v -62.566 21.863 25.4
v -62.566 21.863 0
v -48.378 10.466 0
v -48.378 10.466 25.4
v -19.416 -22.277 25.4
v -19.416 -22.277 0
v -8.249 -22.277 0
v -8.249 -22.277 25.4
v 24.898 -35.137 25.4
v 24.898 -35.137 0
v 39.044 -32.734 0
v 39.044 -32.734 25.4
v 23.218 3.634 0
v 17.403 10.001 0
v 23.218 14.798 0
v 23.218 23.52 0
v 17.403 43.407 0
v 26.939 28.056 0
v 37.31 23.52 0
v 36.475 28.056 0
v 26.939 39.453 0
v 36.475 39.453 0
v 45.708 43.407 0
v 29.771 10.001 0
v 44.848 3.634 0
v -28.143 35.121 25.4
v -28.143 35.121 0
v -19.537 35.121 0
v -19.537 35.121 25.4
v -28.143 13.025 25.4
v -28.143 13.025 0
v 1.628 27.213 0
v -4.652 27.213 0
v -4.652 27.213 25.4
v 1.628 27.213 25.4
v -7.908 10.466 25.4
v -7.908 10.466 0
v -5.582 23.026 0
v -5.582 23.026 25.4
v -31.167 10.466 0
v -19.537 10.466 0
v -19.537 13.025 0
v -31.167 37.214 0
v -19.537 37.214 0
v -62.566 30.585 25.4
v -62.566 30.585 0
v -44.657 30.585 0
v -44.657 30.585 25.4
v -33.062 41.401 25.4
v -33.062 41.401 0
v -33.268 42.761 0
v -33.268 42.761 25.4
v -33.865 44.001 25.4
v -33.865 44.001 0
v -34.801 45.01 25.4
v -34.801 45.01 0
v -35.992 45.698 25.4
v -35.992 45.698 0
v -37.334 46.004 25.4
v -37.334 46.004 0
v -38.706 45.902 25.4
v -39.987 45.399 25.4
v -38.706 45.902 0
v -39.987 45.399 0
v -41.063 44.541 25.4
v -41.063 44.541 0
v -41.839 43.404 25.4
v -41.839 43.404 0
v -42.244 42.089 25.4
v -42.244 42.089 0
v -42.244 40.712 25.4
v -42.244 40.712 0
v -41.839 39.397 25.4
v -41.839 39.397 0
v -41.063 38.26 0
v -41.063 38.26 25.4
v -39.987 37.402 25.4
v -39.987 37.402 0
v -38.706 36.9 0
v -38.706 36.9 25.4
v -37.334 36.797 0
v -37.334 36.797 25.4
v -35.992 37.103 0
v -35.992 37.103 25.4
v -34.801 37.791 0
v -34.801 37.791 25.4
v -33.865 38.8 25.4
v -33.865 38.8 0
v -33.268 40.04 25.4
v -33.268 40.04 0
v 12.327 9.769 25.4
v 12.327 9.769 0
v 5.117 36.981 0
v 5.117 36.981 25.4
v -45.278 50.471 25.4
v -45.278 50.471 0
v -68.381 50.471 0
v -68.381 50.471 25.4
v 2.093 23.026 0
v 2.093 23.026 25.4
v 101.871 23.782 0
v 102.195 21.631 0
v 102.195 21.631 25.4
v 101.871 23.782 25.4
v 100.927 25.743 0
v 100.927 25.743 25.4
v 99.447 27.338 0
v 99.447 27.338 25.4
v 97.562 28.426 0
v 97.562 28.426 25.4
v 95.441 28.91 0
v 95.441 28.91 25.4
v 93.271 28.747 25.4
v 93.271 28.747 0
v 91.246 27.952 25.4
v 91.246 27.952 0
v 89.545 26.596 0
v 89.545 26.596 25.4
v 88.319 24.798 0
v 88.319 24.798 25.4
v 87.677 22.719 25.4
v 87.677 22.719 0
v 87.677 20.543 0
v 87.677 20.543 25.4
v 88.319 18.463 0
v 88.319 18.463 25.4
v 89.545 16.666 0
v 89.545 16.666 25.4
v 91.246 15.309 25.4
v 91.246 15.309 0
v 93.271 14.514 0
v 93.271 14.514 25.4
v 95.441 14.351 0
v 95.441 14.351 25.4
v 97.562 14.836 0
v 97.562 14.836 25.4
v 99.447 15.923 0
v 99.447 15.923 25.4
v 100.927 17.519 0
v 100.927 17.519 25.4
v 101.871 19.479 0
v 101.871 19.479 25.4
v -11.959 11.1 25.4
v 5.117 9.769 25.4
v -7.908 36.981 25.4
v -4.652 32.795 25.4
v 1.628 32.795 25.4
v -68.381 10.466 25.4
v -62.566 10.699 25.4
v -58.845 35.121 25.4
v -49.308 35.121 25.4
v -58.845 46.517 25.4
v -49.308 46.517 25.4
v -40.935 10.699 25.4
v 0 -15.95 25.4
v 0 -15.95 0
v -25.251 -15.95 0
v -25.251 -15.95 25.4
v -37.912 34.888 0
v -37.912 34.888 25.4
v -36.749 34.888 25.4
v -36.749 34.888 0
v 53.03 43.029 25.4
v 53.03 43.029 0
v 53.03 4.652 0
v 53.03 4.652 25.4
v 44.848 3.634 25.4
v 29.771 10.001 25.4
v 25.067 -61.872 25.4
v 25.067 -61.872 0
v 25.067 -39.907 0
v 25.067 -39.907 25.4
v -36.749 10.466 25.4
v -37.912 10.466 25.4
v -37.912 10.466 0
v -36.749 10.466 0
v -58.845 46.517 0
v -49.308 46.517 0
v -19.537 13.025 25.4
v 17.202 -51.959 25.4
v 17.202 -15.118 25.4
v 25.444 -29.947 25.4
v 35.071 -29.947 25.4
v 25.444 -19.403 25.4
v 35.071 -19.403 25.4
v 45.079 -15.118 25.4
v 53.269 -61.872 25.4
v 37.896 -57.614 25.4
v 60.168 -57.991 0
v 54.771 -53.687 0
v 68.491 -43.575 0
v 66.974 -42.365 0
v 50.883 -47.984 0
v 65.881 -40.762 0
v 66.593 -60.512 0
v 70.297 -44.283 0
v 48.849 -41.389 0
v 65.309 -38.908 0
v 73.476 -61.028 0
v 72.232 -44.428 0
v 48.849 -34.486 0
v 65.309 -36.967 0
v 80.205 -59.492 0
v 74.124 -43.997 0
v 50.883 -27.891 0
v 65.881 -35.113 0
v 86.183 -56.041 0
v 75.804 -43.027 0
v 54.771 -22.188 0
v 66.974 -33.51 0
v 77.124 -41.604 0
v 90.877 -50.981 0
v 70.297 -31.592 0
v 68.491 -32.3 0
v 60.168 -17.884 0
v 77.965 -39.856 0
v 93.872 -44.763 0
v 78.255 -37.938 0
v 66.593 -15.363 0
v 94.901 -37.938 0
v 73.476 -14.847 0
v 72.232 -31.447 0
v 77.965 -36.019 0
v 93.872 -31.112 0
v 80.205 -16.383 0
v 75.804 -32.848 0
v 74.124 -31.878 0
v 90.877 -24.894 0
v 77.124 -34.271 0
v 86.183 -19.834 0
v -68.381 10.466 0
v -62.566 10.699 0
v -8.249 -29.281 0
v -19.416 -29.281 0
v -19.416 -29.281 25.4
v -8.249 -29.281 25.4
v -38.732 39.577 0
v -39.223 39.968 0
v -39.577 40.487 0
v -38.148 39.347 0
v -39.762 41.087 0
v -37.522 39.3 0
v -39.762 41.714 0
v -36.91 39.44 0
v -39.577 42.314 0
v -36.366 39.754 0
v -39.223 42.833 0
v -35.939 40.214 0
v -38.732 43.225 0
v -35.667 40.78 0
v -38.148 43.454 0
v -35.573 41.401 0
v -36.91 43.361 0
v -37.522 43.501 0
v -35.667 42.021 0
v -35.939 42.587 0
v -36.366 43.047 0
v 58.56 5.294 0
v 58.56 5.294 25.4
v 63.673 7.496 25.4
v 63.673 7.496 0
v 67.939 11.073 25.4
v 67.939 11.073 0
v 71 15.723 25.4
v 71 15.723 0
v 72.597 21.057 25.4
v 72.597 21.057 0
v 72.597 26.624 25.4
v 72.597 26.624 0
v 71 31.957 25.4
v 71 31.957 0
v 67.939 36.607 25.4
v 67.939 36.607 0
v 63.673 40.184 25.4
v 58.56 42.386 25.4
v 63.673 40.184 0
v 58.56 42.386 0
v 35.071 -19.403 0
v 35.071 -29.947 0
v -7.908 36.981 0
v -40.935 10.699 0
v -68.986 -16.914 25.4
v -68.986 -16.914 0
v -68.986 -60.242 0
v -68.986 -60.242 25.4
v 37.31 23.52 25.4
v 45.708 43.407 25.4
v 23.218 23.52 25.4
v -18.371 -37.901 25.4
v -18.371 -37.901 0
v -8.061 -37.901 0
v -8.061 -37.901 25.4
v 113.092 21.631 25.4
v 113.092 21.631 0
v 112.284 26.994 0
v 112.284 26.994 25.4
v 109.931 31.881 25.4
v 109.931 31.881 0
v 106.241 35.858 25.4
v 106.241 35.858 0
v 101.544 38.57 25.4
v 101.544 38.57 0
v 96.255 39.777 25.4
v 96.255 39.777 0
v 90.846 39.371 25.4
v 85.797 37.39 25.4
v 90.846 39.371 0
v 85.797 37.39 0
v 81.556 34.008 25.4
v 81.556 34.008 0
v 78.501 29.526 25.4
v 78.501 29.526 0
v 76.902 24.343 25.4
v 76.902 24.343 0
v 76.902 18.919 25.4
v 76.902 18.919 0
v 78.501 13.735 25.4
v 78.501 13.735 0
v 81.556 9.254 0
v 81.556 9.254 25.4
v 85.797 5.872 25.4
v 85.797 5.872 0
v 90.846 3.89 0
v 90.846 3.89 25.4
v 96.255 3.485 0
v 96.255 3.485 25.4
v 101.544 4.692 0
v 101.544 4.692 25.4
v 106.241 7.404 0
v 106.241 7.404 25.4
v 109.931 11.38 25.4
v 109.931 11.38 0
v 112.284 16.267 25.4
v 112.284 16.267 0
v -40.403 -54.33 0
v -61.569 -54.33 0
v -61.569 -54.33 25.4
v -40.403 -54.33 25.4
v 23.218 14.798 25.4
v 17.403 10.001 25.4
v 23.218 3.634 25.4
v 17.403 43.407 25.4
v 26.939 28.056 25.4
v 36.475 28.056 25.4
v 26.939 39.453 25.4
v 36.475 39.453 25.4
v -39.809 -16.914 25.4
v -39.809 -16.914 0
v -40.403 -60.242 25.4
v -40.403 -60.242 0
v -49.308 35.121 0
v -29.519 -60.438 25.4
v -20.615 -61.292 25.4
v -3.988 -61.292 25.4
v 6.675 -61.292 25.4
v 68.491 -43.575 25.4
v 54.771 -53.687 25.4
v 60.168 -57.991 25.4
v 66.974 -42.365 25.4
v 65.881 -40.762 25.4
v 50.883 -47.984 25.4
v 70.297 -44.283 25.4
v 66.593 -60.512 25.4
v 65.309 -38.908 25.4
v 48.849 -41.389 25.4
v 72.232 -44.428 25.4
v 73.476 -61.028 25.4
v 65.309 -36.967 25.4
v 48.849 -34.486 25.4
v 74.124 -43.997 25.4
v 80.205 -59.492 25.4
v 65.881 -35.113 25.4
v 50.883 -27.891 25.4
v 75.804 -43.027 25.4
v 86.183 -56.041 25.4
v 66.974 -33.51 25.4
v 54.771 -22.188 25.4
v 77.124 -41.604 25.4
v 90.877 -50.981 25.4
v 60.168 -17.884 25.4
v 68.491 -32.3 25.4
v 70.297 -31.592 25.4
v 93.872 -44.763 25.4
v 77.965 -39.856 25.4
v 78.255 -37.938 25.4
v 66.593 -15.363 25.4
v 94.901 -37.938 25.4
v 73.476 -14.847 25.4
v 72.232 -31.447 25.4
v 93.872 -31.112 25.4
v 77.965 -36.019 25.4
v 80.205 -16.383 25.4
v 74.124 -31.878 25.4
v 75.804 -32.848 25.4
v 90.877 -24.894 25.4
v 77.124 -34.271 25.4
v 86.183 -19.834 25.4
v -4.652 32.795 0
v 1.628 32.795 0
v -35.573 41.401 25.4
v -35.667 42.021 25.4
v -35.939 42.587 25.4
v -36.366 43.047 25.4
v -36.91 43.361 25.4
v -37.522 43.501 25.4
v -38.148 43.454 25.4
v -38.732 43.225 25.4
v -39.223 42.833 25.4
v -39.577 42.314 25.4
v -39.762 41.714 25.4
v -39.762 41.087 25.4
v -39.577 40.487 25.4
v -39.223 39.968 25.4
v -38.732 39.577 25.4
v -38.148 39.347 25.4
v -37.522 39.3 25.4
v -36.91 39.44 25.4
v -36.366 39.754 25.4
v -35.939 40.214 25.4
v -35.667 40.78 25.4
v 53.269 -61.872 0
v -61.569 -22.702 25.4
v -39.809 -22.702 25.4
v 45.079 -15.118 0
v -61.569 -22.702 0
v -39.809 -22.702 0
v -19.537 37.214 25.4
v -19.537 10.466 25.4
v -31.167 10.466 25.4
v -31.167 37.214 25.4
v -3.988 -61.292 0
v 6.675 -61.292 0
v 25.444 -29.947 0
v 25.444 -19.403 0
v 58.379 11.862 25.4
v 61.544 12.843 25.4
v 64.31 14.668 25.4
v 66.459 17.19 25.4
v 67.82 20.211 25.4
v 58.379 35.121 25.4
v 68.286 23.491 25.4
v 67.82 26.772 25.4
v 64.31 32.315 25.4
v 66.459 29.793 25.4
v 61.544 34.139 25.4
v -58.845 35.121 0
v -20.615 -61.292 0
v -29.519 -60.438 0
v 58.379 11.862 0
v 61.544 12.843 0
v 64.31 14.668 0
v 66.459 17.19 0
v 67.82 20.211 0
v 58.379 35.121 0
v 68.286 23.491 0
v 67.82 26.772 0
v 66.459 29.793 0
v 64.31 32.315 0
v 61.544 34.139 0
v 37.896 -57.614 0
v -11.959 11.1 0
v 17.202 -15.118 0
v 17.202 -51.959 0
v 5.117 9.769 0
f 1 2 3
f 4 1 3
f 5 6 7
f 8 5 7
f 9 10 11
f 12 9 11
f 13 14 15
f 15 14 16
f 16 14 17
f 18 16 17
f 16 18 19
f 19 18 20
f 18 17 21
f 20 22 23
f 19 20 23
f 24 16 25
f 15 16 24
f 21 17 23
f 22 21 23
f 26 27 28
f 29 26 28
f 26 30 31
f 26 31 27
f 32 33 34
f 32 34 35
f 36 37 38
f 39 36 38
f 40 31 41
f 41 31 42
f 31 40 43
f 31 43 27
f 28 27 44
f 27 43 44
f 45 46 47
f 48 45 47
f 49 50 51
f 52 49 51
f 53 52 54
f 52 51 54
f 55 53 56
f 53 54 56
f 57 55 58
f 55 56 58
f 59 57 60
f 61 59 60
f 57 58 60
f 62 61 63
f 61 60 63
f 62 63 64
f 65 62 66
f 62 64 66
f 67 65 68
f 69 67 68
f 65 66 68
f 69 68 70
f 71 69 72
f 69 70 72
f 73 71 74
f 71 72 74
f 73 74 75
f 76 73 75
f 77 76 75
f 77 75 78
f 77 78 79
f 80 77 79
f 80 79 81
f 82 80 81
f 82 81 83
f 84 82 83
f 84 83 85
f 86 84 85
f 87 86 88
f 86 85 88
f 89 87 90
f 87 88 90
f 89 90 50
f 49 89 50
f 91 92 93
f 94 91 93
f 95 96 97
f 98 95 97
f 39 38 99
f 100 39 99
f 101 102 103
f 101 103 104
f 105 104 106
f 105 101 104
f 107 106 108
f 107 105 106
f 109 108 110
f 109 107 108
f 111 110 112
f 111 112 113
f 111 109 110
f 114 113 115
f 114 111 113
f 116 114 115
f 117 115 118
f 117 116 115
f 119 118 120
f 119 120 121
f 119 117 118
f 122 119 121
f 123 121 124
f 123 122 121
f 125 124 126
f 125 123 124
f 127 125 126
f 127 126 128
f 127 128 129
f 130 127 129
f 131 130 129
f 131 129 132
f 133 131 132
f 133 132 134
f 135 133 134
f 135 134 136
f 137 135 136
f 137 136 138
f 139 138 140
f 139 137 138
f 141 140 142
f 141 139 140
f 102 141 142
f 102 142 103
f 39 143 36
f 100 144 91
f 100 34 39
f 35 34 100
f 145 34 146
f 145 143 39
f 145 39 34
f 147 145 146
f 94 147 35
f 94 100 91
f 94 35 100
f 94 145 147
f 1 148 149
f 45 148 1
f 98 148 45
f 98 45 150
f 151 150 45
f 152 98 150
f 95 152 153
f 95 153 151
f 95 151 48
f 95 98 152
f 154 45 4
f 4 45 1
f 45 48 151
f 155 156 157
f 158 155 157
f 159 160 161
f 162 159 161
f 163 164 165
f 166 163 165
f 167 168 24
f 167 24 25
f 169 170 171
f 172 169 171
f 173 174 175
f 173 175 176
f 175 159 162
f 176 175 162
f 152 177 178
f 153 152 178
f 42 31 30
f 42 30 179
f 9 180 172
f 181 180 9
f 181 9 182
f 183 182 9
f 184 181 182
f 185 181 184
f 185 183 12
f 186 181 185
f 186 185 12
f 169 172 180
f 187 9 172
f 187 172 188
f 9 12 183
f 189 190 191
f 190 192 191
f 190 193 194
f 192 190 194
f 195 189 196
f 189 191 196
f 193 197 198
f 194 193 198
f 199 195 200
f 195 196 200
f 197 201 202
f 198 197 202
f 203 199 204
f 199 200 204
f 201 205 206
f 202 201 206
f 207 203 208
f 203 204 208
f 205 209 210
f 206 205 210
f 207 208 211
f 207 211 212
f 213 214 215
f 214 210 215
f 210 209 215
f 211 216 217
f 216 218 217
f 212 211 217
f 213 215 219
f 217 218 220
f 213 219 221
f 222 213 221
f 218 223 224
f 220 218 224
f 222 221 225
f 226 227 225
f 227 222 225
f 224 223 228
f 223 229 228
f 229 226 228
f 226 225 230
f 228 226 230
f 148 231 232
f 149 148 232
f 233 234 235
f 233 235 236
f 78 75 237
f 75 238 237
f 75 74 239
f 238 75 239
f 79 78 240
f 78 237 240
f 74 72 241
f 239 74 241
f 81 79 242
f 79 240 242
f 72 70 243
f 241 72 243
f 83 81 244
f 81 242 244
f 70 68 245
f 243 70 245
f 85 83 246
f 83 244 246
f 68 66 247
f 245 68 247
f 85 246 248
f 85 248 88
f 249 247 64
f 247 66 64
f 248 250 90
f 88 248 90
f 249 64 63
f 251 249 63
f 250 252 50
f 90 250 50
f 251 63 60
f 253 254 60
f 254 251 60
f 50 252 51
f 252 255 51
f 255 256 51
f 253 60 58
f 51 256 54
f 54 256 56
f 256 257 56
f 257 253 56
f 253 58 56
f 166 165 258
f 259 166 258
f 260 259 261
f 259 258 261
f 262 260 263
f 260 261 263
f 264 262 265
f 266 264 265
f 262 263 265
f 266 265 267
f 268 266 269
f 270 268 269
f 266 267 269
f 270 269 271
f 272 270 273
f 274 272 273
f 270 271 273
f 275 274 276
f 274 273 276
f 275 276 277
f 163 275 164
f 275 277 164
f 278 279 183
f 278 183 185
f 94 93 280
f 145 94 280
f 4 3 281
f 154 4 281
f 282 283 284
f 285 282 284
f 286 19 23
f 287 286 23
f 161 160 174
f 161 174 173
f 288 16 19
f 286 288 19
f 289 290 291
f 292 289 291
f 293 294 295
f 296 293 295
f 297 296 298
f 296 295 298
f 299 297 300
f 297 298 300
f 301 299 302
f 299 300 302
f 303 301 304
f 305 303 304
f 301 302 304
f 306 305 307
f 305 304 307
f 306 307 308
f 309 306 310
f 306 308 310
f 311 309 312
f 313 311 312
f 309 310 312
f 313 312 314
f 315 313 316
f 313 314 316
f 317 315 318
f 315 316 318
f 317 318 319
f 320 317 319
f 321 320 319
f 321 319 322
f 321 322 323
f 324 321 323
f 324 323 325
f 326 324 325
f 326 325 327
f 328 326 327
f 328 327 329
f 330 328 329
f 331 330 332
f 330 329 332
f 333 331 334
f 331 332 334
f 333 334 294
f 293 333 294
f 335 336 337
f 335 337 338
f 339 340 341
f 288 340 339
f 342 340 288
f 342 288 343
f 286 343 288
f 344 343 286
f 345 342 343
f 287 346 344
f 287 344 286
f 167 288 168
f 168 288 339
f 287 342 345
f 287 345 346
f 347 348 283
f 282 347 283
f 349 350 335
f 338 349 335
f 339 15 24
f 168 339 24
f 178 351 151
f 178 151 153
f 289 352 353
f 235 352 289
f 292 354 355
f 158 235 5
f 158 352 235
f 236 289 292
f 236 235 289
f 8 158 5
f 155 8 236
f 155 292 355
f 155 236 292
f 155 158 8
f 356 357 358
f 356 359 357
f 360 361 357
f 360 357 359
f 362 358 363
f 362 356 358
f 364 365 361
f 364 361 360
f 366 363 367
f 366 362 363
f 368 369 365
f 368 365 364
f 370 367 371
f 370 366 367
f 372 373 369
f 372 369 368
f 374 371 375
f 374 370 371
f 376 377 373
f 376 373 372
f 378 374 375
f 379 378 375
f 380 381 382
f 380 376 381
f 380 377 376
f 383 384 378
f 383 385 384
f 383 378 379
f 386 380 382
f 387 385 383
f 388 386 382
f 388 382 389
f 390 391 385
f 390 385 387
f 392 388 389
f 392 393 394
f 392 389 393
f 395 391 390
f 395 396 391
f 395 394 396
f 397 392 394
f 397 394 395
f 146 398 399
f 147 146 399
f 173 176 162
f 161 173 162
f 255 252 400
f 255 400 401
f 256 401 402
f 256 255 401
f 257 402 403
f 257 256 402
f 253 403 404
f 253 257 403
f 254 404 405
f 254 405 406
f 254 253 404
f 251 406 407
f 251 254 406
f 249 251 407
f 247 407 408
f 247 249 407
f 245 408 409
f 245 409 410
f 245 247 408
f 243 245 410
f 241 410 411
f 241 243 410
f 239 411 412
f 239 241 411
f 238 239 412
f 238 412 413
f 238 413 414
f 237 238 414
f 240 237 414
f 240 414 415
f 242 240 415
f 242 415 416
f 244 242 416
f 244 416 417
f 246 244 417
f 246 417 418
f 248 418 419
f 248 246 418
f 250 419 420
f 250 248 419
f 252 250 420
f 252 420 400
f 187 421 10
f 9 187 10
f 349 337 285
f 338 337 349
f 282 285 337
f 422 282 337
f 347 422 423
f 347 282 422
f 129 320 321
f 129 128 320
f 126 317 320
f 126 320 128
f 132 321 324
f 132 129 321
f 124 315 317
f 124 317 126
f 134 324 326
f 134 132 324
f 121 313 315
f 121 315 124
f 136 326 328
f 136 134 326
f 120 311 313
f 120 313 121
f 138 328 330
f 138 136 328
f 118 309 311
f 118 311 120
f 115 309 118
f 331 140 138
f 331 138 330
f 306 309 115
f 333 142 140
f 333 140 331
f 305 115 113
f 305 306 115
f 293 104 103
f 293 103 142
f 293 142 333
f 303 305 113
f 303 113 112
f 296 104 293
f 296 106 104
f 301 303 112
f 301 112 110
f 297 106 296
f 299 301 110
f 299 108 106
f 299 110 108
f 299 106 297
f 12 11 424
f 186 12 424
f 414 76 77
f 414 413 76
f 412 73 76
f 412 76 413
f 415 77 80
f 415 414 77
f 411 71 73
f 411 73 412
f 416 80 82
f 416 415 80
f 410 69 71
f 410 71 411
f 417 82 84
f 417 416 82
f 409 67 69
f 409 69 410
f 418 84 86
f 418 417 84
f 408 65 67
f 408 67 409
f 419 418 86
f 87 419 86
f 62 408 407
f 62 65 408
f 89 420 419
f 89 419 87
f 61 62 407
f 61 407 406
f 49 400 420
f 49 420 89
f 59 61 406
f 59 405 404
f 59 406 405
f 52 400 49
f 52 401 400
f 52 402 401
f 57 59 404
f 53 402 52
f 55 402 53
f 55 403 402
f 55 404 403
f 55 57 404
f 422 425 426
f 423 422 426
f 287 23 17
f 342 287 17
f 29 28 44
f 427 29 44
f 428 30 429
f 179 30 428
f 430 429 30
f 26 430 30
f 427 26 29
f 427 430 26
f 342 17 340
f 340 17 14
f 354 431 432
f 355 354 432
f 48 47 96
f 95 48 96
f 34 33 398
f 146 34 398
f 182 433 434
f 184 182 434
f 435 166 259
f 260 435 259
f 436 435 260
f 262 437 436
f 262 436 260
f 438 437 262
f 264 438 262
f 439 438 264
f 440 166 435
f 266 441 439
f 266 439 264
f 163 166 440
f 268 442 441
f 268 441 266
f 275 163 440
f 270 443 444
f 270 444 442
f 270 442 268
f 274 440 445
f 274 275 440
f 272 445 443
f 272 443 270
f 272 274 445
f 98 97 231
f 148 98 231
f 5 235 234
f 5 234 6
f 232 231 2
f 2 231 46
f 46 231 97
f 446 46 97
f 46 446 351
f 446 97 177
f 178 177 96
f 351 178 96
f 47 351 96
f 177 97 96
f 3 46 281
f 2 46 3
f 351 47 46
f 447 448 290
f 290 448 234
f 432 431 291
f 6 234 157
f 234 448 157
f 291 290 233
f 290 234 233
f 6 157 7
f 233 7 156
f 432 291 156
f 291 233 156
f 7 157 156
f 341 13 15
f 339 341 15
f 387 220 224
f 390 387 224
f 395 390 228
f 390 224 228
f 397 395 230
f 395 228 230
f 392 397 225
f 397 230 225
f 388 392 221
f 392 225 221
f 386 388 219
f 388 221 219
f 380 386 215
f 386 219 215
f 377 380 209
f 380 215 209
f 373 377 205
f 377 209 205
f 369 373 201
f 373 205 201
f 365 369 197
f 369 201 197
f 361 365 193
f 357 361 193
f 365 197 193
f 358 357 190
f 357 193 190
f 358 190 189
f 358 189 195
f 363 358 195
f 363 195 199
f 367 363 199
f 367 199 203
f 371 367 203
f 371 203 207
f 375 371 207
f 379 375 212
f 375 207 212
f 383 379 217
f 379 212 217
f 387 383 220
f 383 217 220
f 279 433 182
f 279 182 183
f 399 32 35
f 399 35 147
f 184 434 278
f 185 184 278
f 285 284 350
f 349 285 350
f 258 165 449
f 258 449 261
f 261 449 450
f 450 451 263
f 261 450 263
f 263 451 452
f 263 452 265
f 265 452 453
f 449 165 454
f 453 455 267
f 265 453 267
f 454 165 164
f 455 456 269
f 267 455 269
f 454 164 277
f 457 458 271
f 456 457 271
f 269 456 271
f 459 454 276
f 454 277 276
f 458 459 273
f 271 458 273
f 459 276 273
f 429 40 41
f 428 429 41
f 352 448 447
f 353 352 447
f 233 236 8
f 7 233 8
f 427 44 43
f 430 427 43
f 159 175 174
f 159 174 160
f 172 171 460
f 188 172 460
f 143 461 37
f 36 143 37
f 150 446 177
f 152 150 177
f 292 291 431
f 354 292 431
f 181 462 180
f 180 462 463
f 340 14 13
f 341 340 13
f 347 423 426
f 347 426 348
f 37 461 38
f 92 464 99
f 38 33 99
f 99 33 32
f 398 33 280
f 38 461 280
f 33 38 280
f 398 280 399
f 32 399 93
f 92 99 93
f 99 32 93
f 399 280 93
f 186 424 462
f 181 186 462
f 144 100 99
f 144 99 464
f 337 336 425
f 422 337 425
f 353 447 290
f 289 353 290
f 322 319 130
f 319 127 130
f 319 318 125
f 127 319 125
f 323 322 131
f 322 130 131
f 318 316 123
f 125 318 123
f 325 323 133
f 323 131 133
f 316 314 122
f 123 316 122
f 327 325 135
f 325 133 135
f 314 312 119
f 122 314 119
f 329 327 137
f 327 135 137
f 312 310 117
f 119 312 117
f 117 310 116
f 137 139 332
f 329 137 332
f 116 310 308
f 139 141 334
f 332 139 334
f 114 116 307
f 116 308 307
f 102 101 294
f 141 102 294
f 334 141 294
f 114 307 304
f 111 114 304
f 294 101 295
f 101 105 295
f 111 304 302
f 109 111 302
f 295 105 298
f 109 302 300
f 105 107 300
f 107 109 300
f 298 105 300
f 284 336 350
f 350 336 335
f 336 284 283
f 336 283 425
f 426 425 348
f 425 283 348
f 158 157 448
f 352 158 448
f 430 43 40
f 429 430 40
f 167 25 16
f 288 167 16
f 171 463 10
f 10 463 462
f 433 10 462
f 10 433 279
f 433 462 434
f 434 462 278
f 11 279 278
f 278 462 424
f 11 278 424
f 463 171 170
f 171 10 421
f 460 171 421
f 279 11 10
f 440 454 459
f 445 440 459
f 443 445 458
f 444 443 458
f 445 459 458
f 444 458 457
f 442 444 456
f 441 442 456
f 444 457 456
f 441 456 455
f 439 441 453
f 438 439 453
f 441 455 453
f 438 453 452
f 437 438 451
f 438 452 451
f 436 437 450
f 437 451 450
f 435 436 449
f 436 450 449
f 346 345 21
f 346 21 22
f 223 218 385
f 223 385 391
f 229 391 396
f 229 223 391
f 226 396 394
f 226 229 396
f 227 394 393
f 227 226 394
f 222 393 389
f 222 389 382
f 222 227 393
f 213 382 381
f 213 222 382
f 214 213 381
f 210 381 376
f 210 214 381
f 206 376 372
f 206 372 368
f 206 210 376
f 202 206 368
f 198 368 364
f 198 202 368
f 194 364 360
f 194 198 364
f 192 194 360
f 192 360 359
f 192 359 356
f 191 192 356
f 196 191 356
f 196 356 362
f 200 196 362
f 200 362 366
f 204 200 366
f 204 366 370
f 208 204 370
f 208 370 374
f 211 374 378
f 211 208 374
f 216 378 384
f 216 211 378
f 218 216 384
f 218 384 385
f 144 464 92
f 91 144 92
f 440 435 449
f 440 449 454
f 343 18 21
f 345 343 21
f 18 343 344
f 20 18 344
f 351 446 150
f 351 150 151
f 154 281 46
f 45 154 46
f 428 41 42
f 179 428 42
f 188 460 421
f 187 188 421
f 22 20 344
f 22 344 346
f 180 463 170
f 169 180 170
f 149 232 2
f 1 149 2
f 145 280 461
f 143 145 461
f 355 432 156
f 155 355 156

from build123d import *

# Parameters (mm, degrees)
F0_W     = 9.536073
F0_H     = 11.396769
F0_W_2   = 1.162939
F0_H_2   = 24.421656
F0_W_3   = 8.605726
F0_H_3   = 2.093285
F0_W_4   = 3.023634
F0_H_4   = 22.095786
F0_H_5   = 2.558459
F0_W_5   = 6.279856
F0_H_6   = 5.582091
F0_R     = 4.616726
F0_R_2   = 2.106167
F0_H_7   = 11.39677
F0_R_3   = 18.196885
F0_R_4   = 7.299681
F1_DEPTH = 25.4
F2_W     = 21.759618
F2_H     = 5.788458
F2_W_2   = 7.417336
F2_H_2   = 31.627799
F2_W_3   = 21.165684
F2_H_3   = 5.911771
F2_W_4   = 11.166713
F2_H_4   = 7.003504
F2_W_5   = 9.626577
F2_H_5   = 10.544119
F2_R     = 23.155378
F2_R_2   = 6.509144
F3_DEPTH = 25.4


with BuildPart() as f1:
    # F0 (on Top) → F1 (new body)
    with BuildSketch(Plane.XY):
        Polygon((-62.56596, 50.471425), (-68.380639, 50.471425), (-68.380639, 10.466425), (-62.56596, 10.699012), (-62.56596, 21.863198), (-62.56596, 30.585219), align=None)
        Polygon((-45.278189, 50.471425), (-62.56596, 50.471425), (-62.56596, 30.585219), (-44.656744, 30.585219), align=None)
        with Locations((-54.076526, 40.819054)):
            Rectangle(F0_W, F0_H, mode=Mode.SUBTRACT)
        Polygon((-40.935349, 10.699012), (-62.56596, 30.585219), (-62.56596, 21.863198), (-48.37814, 10.466425), align=None)
        with Locations((-37.330247, 22.677253)):
            Rectangle(F0_W_2, F0_H_2)
        with Locations((-23.840189, 36.167312)):
            Rectangle(F0_W_3, F0_H_3)
        with Locations((-29.654869, 36.167312)):
            Rectangle(F0_W_4, F0_H_3)
        with Locations((-29.654869, 24.072777)):
            Rectangle(F0_W_4, F0_H_4)
        with Locations((-23.840189, 11.745655)):
            Rectangle(F0_W_3, F0_H_5)
        with Locations((-29.654869, 11.745655)):
            Rectangle(F0_W_4, F0_H_5)
        Polygon((-7.907964, 36.981367), (-11.958886, 11.100482), (-7.907964, 10.466425), (-5.582093, 23.026133), (2.093286, 23.026133), (5.11692, 9.768663), (12.327122, 9.768663), (5.11692, 36.981367), align=None)
        with Locations((-1.511816, 30.00375)):
            Rectangle(F0_W_5, F0_H_6, mode=Mode.SUBTRACT)
        with Locations((-37.679128, 41.400526)):
            Circle(F0_R)
        with Locations((-37.679128, 41.400526)):
            Circle(F0_R_2, mode=Mode.SUBTRACT)
        Polygon((23.217608, 43.406588), (17.402929, 43.406588), (17.402929, 10.001251), (23.217608, 3.634176), (23.217608, 14.798361), (23.217608, 23.520382), align=None)
        Polygon((45.70768, 43.406588), (23.217608, 43.406588), (23.217608, 23.520382), (37.309691, 23.520382), align=None)
        with Locations((31.707041, 33.754218)):
            Rectangle(F0_W, F0_H_7, mode=Mode.SUBTRACT)
        Polygon((44.848219, 3.634176), (23.217608, 23.520382), (23.217608, 14.798361), (29.771162, 10.001251), align=None)
        with BuildLine():
            ThreePointArc((53.029884, 4.651744), (72.800154, 23.840189), (53.029884, 43.028634))
            Line((53.029884, 43.028634), (53.029884, 4.651744))
        make_face()
        with BuildLine():
            Line((58.379389, 11.861947), (58.379389, 35.12067))
            ThreePointArc((58.379389, 35.12067), (68.28618, 23.491309), (58.379389, 11.861947))
        make_face(mode=Mode.SUBTRACT)
        with Locations((94.895586, 21.630611)):
            Circle(F0_R_3)
        with Locations((94.895586, 21.630611)):
            Circle(F0_R_4, mode=Mode.SUBTRACT)
    extrude(amount=F1_DEPTH)


with BuildPart() as f3:
    # F2 (on Top) → F3 (new body)
    with BuildSketch(Plane.XY):
        with Locations((-50.689129, -19.807878)):
            Rectangle(F2_W, F2_H)
        with Locations((-65.277606, -19.807878)):
            Rectangle(F2_W_2, F2_H)
        with Locations((-65.277606, -38.516006)):
            Rectangle(F2_W_2, F2_H_2)
        with Locations((-50.986096, -57.285791)):
            Rectangle(F2_W_3, F2_H_3)
        with Locations((-65.277606, -57.285791)):
            Rectangle(F2_W_2, F2_H_3)
        Polygon((-25.25148, -15.949626), (-29.519115, -60.437977), (-20.614877, -61.292134), (-18.371023, -37.900865), (-8.061179, -37.900865), (-3.987571, -61.292134), (6.675277, -61.292134), (0, -15.949626), align=None)
        with Locations((-13.832832, -25.778763)):
            Rectangle(F2_W_4, F2_H_4, mode=Mode.SUBTRACT)
        Polygon((45.079157, -15.117963), (17.202187, -15.117963), (17.202187, -51.95858), (25.06683, -61.872255), (25.06683, -39.906763), (37.896238, -57.61433), (53.268798, -61.872255), (24.897642, -35.137221), (39.044365, -32.733675), align=None)
        with Locations((30.257473, -24.675267)):
            Rectangle(F2_W_5, F2_H_5, mode=Mode.SUBTRACT)
        with Locations((71.745455, -37.937522)):
            Circle(F2_R)
        with Locations((71.745455, -37.937522)):
            Circle(F2_R_2, mode=Mode.SUBTRACT)
    extrude(amount=F3_DEPTH)


solid = Compound([f1.part, f3.part])
